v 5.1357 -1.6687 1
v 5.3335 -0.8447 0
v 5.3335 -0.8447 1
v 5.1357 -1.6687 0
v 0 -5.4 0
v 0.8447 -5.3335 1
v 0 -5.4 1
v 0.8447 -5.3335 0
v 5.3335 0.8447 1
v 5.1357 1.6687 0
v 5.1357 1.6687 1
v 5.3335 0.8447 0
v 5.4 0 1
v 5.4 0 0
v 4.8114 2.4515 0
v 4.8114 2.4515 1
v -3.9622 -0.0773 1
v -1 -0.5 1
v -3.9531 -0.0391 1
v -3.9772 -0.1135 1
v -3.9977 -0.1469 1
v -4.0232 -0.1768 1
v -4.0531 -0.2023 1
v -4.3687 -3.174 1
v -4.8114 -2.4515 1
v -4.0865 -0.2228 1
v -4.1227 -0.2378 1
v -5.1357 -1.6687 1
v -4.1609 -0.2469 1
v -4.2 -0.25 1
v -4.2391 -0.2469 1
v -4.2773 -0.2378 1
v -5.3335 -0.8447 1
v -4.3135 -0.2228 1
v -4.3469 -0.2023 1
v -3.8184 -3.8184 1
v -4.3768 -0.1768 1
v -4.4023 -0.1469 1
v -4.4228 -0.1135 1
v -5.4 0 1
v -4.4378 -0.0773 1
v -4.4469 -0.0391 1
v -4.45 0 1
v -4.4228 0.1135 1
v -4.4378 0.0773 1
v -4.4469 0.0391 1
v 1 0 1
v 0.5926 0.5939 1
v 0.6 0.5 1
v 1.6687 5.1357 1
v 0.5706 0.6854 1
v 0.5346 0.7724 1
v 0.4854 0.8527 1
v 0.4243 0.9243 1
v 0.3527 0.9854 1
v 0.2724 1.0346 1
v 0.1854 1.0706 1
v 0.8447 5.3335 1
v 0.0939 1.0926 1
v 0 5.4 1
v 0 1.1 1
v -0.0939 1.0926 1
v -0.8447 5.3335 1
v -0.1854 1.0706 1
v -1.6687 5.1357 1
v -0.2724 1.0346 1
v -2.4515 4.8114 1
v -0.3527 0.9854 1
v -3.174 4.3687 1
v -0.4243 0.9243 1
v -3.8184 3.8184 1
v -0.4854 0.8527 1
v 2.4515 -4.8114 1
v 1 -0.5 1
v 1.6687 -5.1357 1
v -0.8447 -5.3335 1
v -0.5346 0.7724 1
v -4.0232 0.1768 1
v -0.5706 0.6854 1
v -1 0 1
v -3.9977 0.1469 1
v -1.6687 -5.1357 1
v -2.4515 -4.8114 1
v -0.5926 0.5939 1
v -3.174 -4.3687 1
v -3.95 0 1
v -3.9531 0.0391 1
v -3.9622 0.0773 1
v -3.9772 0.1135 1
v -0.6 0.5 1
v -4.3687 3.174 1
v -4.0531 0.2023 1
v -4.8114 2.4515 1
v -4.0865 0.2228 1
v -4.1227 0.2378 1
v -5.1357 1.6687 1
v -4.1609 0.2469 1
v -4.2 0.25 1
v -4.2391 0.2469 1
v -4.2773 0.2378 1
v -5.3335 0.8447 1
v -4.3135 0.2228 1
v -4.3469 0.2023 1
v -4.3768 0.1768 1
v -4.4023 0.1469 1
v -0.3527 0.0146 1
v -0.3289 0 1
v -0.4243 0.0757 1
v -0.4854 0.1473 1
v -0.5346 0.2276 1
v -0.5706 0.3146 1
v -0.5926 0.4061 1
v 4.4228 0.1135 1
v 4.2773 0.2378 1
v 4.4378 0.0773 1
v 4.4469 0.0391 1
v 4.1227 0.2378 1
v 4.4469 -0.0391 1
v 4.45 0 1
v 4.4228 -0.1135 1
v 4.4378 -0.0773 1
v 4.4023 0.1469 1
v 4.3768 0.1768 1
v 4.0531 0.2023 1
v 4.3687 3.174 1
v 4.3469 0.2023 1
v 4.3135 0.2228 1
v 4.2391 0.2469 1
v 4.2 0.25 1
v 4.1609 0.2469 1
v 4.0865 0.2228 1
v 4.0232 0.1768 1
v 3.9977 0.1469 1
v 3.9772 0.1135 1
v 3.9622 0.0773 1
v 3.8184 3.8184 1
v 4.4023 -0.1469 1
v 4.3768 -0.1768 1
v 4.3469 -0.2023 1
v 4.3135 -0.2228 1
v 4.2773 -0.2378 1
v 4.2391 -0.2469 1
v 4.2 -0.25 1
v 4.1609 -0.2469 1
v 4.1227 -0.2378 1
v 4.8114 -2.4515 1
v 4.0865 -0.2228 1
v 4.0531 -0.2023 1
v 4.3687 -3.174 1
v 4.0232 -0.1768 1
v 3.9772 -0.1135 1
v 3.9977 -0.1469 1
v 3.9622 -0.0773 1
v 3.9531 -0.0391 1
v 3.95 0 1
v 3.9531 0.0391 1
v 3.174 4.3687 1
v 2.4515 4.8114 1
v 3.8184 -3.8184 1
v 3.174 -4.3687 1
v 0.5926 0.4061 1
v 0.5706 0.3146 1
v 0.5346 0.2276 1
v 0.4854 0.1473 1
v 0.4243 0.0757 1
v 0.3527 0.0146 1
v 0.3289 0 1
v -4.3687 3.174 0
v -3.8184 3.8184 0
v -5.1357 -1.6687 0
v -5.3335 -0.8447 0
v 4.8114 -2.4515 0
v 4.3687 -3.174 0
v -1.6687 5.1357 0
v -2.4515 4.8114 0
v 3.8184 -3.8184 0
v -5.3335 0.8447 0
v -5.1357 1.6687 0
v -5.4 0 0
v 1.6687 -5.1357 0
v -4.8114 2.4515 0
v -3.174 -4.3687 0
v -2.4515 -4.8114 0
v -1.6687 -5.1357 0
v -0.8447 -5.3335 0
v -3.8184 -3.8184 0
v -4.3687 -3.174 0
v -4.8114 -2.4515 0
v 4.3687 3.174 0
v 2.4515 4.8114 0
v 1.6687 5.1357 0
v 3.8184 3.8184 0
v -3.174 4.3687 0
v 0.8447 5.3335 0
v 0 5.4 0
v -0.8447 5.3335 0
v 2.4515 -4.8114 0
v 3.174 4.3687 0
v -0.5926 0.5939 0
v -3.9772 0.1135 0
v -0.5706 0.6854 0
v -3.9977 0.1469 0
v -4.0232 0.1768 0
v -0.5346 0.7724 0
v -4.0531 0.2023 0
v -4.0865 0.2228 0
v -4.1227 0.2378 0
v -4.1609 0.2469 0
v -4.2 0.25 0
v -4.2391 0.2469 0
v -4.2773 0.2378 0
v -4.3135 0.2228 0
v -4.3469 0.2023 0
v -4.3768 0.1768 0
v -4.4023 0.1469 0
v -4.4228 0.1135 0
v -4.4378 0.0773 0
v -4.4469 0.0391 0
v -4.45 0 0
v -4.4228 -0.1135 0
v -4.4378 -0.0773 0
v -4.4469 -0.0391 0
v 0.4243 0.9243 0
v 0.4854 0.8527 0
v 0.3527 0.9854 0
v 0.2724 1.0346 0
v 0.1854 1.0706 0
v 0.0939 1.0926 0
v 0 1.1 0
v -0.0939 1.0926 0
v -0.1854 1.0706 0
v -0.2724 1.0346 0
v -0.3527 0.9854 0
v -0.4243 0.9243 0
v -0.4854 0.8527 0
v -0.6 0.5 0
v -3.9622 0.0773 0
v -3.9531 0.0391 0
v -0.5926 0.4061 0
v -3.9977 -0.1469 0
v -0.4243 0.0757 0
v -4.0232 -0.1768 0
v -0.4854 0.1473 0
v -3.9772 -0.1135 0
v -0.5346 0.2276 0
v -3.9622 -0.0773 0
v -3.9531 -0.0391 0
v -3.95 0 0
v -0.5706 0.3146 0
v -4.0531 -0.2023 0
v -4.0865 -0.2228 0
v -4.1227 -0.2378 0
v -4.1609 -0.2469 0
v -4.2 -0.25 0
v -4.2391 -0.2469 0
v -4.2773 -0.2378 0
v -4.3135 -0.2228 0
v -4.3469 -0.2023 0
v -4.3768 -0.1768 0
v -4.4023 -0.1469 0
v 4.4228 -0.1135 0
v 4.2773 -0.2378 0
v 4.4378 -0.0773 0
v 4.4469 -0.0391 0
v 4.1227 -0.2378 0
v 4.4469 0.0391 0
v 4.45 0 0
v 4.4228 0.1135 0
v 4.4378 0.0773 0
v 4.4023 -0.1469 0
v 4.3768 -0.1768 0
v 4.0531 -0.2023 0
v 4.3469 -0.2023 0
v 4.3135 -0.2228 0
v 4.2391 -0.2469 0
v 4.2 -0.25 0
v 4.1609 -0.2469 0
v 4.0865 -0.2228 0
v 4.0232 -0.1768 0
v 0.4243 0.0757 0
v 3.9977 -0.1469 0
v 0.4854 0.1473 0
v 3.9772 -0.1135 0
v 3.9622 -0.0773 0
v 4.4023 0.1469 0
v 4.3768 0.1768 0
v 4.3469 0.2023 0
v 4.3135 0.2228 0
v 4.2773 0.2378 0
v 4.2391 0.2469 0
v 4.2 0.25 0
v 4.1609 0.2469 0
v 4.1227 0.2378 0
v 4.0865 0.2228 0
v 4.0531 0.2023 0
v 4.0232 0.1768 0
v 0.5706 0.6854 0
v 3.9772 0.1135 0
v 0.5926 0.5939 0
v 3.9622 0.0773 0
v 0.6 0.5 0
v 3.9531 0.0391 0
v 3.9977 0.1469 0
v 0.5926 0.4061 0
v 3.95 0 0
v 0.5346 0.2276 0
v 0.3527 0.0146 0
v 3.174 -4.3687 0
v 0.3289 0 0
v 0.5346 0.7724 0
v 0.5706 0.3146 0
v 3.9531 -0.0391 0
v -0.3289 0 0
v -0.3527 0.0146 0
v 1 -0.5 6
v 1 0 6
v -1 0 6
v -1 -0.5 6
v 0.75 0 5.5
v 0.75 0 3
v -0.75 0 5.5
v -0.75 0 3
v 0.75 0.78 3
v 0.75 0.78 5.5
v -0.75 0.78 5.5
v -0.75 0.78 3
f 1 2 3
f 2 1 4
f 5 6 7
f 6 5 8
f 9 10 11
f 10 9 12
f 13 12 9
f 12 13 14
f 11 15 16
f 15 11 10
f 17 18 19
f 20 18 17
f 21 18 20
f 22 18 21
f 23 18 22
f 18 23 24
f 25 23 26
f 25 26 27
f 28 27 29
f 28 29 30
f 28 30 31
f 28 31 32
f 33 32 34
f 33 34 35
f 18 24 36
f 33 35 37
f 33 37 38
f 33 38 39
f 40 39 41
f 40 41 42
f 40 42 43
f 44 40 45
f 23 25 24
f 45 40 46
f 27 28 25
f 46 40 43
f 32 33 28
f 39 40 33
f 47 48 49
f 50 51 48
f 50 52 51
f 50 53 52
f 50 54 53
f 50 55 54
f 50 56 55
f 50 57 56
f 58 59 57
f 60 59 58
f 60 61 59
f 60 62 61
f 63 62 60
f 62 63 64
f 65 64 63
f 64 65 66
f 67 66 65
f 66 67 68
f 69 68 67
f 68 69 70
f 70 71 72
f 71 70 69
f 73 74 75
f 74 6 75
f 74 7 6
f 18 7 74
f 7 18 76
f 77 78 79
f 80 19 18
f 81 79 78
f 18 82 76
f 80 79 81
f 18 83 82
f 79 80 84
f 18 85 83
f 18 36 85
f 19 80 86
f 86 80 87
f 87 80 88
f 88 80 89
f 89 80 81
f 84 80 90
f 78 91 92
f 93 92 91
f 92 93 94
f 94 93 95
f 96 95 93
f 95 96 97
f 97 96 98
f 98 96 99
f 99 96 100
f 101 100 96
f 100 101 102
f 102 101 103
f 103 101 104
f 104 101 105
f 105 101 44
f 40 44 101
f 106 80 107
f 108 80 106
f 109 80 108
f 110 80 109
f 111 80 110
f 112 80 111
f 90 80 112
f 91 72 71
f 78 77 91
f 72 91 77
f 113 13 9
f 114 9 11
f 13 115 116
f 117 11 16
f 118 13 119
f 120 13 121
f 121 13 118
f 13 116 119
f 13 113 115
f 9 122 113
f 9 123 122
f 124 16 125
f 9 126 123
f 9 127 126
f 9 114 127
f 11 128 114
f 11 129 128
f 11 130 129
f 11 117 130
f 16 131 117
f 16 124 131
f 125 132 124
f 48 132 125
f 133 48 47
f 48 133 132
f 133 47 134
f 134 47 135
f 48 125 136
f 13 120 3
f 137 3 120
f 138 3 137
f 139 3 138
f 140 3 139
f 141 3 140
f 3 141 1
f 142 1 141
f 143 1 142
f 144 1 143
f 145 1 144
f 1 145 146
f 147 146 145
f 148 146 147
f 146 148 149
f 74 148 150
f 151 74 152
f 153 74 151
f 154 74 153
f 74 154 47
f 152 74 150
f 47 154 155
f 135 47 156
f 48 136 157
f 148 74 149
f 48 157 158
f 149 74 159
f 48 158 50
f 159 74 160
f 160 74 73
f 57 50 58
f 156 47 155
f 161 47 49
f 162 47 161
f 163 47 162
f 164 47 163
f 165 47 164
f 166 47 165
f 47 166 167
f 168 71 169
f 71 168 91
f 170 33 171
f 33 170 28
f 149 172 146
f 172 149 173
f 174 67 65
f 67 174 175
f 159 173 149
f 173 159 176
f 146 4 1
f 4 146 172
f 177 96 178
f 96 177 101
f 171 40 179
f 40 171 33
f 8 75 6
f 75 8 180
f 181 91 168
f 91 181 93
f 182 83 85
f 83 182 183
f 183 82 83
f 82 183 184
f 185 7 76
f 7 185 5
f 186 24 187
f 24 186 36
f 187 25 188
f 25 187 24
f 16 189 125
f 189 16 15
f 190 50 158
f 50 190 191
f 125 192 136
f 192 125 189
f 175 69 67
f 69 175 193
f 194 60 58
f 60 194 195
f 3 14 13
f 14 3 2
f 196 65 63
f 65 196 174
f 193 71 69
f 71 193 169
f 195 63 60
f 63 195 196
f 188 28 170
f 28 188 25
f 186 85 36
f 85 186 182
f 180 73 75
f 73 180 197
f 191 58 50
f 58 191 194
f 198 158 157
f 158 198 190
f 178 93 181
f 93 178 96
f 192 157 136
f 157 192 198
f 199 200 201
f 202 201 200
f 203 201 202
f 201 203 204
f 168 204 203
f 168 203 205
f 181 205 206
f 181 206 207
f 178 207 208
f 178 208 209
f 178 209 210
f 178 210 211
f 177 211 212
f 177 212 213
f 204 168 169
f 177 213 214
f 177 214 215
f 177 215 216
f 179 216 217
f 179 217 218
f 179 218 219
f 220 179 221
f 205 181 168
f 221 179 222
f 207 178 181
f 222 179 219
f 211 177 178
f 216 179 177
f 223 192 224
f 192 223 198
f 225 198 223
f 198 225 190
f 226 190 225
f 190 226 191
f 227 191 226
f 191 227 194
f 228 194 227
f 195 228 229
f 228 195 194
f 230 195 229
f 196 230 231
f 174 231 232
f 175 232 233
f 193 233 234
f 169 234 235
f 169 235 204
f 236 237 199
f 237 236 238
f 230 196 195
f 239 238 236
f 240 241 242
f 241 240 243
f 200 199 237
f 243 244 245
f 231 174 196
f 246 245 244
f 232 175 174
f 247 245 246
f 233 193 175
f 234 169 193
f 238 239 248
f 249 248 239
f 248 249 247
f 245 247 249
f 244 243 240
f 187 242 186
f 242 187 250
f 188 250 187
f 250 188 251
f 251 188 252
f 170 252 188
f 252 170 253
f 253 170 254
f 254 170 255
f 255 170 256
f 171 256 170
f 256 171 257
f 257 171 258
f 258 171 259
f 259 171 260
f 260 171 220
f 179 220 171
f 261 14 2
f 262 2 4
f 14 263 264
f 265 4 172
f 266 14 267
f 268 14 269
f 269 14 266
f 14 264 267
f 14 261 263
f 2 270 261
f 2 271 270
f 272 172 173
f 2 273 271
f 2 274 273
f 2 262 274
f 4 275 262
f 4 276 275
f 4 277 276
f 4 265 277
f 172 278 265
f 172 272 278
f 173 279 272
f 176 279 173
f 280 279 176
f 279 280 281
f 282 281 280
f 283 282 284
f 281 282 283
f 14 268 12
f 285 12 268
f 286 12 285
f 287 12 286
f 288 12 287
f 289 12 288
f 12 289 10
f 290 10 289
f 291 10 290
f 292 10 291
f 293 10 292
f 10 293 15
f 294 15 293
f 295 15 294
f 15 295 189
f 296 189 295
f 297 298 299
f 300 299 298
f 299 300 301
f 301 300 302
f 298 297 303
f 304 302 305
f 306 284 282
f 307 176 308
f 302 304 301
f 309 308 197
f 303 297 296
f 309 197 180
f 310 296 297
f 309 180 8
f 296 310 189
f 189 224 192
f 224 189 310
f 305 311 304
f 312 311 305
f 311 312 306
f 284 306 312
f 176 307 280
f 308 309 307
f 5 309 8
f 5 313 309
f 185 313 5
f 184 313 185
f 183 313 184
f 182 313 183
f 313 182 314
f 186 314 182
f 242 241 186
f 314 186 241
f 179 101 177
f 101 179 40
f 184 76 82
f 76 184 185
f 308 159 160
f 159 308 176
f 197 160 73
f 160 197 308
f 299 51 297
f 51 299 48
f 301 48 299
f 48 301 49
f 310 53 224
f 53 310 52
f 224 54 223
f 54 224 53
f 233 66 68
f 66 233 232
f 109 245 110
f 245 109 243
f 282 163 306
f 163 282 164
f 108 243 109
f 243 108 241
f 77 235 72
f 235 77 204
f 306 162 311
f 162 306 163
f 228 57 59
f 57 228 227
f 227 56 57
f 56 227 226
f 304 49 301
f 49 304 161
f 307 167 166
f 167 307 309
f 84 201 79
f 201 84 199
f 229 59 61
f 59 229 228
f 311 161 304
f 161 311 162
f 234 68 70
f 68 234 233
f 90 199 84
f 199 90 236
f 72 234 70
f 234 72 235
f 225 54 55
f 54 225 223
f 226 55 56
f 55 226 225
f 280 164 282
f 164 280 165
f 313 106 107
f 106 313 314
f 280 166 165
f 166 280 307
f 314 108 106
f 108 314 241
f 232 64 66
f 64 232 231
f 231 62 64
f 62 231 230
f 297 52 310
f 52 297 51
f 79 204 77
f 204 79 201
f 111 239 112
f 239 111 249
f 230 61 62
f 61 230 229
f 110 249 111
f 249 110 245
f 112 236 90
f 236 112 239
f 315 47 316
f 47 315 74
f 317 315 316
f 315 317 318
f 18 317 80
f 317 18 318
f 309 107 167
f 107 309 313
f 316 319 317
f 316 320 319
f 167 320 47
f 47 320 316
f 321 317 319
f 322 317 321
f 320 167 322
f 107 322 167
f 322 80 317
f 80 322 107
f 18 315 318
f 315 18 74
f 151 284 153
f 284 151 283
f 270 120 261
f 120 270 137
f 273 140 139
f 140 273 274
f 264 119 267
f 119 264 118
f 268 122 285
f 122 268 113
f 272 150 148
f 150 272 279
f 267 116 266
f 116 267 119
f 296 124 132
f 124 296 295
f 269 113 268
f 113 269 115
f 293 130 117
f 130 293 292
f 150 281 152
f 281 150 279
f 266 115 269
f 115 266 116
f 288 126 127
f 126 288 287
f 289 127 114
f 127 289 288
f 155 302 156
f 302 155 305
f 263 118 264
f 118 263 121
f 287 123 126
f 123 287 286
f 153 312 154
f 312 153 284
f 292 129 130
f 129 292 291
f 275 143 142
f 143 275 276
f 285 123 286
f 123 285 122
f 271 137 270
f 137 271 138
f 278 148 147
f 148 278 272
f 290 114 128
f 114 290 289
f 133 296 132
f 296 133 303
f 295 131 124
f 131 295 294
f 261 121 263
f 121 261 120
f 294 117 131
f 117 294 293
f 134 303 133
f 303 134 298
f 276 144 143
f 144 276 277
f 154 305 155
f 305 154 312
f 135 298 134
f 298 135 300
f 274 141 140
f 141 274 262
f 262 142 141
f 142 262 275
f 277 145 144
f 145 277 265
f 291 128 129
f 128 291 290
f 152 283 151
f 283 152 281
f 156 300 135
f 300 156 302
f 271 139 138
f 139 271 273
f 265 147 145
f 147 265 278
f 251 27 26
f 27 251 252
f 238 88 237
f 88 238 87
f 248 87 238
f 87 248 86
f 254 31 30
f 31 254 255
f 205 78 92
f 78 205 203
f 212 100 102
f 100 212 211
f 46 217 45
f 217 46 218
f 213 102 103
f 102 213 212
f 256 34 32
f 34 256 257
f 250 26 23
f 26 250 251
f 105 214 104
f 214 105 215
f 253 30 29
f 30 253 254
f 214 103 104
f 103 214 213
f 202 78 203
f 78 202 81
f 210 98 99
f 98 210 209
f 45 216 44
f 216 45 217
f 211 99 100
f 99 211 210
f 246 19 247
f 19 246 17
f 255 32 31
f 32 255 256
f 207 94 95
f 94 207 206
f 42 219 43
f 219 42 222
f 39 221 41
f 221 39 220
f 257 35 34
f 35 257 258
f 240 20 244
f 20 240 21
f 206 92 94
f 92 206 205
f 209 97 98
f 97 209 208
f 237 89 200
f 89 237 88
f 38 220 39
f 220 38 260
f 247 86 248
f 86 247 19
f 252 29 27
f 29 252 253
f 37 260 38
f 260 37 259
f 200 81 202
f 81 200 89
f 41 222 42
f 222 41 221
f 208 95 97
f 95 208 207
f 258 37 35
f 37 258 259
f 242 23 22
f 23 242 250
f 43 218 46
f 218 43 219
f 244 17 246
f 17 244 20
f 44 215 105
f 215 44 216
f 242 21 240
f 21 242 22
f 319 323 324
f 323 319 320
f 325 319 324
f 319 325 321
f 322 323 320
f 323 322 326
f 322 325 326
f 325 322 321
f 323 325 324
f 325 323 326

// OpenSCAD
res=40;
height=3;
width=6;
stick_width=0.5;

module dht22() {
    color("red") cube([1.5,0.78,2.5]);
}

module bottom_plate() {
    difference() {
        union() {
            translate([-1, -0.5, 0]) cube([2, 0.5, 6]);
            difference() {
                cylinder(h=1,r1=width*0.9,r2=width*0.9,$fn=res);
                translate([0, 0.5, 0]) cylinder(h=height,r1=width/10,r2=width/10,$fn=res);
            }
        }
        translate([offset, 0, 0]) cylinder(h=height,r1=stick_width/2,r2=stick_width/2,$fn=res);
        translate([-offset, 0, 0]) cylinder(h=height,r1=stick_width/2,r2=stick_width/2,$fn=res);
    }
}

module ring(width=10, height=3, wall=0.5, res=50, holes=true) {
    inner_width = width*0.7;
    difference() {
        cylinder(h=height,r1=width,r2=width,$fn=res);
        cylinder(h=height,r1=width-wall*2,r2=width-wall*2,$fn=res);
    }
    
    translate([0, 0, height])
        difference() {
            cylinder(h=height,r1=width,r2=inner_width,$fn=res);
            if(holes){
                cylinder(h=height,r1=width-wall*2,r2=inner_width-wall*2,$fn=res);
                translate([offset, 0, 0]) cylinder(h=height,r1=stick_width/2,r2=stick_width/2,$fn=res);
                translate([-offset, 0, 0]) cylinder(h=height,r1=stick_width/2,r2=stick_width/2,$fn=res);
            }
        }
}

module stick() {
    difference () {
        cylinder(h=height,r1=width,r2=width,$fn=res);
        cylinder(h=height,r1=width/2,r2=width/2,$fn=res);
    };
}

module cap() {
    difference() {
        cylinder(h=height*2,r1=width,r2=0,$fn=res);
        translate([0, 0, -height/2])
        cylinder(h=height*2,r1=width,r2=0,$fn=res);
    }
}


bottom_plate();
translate([-0.75, 0, 3]) dht22();

count=0;
offset=width*0.7;
translate([0, 0, height/2])
for(y=[0:height:count*height-1]) {
    translate([0, 0, y]) ring(width=width, height=height/2, wall=0.25);
    translate([offset, 0, y]) stick(width=stick_width);
    translate([-offset, 0, y]) stick(width=stick_width);
}

cap_y=count*height+height/2;
%translate([0, 0, cap_y]) ring(width=width, height=height/2, wall=0.25, holes=false);

//cap_y=(count+1)*height;
//translate([0, 0, cap_y]) cap();
//translate([-offset, 0, cap_y]) stick();
//translate([offset, 0, cap_y]) stick();
